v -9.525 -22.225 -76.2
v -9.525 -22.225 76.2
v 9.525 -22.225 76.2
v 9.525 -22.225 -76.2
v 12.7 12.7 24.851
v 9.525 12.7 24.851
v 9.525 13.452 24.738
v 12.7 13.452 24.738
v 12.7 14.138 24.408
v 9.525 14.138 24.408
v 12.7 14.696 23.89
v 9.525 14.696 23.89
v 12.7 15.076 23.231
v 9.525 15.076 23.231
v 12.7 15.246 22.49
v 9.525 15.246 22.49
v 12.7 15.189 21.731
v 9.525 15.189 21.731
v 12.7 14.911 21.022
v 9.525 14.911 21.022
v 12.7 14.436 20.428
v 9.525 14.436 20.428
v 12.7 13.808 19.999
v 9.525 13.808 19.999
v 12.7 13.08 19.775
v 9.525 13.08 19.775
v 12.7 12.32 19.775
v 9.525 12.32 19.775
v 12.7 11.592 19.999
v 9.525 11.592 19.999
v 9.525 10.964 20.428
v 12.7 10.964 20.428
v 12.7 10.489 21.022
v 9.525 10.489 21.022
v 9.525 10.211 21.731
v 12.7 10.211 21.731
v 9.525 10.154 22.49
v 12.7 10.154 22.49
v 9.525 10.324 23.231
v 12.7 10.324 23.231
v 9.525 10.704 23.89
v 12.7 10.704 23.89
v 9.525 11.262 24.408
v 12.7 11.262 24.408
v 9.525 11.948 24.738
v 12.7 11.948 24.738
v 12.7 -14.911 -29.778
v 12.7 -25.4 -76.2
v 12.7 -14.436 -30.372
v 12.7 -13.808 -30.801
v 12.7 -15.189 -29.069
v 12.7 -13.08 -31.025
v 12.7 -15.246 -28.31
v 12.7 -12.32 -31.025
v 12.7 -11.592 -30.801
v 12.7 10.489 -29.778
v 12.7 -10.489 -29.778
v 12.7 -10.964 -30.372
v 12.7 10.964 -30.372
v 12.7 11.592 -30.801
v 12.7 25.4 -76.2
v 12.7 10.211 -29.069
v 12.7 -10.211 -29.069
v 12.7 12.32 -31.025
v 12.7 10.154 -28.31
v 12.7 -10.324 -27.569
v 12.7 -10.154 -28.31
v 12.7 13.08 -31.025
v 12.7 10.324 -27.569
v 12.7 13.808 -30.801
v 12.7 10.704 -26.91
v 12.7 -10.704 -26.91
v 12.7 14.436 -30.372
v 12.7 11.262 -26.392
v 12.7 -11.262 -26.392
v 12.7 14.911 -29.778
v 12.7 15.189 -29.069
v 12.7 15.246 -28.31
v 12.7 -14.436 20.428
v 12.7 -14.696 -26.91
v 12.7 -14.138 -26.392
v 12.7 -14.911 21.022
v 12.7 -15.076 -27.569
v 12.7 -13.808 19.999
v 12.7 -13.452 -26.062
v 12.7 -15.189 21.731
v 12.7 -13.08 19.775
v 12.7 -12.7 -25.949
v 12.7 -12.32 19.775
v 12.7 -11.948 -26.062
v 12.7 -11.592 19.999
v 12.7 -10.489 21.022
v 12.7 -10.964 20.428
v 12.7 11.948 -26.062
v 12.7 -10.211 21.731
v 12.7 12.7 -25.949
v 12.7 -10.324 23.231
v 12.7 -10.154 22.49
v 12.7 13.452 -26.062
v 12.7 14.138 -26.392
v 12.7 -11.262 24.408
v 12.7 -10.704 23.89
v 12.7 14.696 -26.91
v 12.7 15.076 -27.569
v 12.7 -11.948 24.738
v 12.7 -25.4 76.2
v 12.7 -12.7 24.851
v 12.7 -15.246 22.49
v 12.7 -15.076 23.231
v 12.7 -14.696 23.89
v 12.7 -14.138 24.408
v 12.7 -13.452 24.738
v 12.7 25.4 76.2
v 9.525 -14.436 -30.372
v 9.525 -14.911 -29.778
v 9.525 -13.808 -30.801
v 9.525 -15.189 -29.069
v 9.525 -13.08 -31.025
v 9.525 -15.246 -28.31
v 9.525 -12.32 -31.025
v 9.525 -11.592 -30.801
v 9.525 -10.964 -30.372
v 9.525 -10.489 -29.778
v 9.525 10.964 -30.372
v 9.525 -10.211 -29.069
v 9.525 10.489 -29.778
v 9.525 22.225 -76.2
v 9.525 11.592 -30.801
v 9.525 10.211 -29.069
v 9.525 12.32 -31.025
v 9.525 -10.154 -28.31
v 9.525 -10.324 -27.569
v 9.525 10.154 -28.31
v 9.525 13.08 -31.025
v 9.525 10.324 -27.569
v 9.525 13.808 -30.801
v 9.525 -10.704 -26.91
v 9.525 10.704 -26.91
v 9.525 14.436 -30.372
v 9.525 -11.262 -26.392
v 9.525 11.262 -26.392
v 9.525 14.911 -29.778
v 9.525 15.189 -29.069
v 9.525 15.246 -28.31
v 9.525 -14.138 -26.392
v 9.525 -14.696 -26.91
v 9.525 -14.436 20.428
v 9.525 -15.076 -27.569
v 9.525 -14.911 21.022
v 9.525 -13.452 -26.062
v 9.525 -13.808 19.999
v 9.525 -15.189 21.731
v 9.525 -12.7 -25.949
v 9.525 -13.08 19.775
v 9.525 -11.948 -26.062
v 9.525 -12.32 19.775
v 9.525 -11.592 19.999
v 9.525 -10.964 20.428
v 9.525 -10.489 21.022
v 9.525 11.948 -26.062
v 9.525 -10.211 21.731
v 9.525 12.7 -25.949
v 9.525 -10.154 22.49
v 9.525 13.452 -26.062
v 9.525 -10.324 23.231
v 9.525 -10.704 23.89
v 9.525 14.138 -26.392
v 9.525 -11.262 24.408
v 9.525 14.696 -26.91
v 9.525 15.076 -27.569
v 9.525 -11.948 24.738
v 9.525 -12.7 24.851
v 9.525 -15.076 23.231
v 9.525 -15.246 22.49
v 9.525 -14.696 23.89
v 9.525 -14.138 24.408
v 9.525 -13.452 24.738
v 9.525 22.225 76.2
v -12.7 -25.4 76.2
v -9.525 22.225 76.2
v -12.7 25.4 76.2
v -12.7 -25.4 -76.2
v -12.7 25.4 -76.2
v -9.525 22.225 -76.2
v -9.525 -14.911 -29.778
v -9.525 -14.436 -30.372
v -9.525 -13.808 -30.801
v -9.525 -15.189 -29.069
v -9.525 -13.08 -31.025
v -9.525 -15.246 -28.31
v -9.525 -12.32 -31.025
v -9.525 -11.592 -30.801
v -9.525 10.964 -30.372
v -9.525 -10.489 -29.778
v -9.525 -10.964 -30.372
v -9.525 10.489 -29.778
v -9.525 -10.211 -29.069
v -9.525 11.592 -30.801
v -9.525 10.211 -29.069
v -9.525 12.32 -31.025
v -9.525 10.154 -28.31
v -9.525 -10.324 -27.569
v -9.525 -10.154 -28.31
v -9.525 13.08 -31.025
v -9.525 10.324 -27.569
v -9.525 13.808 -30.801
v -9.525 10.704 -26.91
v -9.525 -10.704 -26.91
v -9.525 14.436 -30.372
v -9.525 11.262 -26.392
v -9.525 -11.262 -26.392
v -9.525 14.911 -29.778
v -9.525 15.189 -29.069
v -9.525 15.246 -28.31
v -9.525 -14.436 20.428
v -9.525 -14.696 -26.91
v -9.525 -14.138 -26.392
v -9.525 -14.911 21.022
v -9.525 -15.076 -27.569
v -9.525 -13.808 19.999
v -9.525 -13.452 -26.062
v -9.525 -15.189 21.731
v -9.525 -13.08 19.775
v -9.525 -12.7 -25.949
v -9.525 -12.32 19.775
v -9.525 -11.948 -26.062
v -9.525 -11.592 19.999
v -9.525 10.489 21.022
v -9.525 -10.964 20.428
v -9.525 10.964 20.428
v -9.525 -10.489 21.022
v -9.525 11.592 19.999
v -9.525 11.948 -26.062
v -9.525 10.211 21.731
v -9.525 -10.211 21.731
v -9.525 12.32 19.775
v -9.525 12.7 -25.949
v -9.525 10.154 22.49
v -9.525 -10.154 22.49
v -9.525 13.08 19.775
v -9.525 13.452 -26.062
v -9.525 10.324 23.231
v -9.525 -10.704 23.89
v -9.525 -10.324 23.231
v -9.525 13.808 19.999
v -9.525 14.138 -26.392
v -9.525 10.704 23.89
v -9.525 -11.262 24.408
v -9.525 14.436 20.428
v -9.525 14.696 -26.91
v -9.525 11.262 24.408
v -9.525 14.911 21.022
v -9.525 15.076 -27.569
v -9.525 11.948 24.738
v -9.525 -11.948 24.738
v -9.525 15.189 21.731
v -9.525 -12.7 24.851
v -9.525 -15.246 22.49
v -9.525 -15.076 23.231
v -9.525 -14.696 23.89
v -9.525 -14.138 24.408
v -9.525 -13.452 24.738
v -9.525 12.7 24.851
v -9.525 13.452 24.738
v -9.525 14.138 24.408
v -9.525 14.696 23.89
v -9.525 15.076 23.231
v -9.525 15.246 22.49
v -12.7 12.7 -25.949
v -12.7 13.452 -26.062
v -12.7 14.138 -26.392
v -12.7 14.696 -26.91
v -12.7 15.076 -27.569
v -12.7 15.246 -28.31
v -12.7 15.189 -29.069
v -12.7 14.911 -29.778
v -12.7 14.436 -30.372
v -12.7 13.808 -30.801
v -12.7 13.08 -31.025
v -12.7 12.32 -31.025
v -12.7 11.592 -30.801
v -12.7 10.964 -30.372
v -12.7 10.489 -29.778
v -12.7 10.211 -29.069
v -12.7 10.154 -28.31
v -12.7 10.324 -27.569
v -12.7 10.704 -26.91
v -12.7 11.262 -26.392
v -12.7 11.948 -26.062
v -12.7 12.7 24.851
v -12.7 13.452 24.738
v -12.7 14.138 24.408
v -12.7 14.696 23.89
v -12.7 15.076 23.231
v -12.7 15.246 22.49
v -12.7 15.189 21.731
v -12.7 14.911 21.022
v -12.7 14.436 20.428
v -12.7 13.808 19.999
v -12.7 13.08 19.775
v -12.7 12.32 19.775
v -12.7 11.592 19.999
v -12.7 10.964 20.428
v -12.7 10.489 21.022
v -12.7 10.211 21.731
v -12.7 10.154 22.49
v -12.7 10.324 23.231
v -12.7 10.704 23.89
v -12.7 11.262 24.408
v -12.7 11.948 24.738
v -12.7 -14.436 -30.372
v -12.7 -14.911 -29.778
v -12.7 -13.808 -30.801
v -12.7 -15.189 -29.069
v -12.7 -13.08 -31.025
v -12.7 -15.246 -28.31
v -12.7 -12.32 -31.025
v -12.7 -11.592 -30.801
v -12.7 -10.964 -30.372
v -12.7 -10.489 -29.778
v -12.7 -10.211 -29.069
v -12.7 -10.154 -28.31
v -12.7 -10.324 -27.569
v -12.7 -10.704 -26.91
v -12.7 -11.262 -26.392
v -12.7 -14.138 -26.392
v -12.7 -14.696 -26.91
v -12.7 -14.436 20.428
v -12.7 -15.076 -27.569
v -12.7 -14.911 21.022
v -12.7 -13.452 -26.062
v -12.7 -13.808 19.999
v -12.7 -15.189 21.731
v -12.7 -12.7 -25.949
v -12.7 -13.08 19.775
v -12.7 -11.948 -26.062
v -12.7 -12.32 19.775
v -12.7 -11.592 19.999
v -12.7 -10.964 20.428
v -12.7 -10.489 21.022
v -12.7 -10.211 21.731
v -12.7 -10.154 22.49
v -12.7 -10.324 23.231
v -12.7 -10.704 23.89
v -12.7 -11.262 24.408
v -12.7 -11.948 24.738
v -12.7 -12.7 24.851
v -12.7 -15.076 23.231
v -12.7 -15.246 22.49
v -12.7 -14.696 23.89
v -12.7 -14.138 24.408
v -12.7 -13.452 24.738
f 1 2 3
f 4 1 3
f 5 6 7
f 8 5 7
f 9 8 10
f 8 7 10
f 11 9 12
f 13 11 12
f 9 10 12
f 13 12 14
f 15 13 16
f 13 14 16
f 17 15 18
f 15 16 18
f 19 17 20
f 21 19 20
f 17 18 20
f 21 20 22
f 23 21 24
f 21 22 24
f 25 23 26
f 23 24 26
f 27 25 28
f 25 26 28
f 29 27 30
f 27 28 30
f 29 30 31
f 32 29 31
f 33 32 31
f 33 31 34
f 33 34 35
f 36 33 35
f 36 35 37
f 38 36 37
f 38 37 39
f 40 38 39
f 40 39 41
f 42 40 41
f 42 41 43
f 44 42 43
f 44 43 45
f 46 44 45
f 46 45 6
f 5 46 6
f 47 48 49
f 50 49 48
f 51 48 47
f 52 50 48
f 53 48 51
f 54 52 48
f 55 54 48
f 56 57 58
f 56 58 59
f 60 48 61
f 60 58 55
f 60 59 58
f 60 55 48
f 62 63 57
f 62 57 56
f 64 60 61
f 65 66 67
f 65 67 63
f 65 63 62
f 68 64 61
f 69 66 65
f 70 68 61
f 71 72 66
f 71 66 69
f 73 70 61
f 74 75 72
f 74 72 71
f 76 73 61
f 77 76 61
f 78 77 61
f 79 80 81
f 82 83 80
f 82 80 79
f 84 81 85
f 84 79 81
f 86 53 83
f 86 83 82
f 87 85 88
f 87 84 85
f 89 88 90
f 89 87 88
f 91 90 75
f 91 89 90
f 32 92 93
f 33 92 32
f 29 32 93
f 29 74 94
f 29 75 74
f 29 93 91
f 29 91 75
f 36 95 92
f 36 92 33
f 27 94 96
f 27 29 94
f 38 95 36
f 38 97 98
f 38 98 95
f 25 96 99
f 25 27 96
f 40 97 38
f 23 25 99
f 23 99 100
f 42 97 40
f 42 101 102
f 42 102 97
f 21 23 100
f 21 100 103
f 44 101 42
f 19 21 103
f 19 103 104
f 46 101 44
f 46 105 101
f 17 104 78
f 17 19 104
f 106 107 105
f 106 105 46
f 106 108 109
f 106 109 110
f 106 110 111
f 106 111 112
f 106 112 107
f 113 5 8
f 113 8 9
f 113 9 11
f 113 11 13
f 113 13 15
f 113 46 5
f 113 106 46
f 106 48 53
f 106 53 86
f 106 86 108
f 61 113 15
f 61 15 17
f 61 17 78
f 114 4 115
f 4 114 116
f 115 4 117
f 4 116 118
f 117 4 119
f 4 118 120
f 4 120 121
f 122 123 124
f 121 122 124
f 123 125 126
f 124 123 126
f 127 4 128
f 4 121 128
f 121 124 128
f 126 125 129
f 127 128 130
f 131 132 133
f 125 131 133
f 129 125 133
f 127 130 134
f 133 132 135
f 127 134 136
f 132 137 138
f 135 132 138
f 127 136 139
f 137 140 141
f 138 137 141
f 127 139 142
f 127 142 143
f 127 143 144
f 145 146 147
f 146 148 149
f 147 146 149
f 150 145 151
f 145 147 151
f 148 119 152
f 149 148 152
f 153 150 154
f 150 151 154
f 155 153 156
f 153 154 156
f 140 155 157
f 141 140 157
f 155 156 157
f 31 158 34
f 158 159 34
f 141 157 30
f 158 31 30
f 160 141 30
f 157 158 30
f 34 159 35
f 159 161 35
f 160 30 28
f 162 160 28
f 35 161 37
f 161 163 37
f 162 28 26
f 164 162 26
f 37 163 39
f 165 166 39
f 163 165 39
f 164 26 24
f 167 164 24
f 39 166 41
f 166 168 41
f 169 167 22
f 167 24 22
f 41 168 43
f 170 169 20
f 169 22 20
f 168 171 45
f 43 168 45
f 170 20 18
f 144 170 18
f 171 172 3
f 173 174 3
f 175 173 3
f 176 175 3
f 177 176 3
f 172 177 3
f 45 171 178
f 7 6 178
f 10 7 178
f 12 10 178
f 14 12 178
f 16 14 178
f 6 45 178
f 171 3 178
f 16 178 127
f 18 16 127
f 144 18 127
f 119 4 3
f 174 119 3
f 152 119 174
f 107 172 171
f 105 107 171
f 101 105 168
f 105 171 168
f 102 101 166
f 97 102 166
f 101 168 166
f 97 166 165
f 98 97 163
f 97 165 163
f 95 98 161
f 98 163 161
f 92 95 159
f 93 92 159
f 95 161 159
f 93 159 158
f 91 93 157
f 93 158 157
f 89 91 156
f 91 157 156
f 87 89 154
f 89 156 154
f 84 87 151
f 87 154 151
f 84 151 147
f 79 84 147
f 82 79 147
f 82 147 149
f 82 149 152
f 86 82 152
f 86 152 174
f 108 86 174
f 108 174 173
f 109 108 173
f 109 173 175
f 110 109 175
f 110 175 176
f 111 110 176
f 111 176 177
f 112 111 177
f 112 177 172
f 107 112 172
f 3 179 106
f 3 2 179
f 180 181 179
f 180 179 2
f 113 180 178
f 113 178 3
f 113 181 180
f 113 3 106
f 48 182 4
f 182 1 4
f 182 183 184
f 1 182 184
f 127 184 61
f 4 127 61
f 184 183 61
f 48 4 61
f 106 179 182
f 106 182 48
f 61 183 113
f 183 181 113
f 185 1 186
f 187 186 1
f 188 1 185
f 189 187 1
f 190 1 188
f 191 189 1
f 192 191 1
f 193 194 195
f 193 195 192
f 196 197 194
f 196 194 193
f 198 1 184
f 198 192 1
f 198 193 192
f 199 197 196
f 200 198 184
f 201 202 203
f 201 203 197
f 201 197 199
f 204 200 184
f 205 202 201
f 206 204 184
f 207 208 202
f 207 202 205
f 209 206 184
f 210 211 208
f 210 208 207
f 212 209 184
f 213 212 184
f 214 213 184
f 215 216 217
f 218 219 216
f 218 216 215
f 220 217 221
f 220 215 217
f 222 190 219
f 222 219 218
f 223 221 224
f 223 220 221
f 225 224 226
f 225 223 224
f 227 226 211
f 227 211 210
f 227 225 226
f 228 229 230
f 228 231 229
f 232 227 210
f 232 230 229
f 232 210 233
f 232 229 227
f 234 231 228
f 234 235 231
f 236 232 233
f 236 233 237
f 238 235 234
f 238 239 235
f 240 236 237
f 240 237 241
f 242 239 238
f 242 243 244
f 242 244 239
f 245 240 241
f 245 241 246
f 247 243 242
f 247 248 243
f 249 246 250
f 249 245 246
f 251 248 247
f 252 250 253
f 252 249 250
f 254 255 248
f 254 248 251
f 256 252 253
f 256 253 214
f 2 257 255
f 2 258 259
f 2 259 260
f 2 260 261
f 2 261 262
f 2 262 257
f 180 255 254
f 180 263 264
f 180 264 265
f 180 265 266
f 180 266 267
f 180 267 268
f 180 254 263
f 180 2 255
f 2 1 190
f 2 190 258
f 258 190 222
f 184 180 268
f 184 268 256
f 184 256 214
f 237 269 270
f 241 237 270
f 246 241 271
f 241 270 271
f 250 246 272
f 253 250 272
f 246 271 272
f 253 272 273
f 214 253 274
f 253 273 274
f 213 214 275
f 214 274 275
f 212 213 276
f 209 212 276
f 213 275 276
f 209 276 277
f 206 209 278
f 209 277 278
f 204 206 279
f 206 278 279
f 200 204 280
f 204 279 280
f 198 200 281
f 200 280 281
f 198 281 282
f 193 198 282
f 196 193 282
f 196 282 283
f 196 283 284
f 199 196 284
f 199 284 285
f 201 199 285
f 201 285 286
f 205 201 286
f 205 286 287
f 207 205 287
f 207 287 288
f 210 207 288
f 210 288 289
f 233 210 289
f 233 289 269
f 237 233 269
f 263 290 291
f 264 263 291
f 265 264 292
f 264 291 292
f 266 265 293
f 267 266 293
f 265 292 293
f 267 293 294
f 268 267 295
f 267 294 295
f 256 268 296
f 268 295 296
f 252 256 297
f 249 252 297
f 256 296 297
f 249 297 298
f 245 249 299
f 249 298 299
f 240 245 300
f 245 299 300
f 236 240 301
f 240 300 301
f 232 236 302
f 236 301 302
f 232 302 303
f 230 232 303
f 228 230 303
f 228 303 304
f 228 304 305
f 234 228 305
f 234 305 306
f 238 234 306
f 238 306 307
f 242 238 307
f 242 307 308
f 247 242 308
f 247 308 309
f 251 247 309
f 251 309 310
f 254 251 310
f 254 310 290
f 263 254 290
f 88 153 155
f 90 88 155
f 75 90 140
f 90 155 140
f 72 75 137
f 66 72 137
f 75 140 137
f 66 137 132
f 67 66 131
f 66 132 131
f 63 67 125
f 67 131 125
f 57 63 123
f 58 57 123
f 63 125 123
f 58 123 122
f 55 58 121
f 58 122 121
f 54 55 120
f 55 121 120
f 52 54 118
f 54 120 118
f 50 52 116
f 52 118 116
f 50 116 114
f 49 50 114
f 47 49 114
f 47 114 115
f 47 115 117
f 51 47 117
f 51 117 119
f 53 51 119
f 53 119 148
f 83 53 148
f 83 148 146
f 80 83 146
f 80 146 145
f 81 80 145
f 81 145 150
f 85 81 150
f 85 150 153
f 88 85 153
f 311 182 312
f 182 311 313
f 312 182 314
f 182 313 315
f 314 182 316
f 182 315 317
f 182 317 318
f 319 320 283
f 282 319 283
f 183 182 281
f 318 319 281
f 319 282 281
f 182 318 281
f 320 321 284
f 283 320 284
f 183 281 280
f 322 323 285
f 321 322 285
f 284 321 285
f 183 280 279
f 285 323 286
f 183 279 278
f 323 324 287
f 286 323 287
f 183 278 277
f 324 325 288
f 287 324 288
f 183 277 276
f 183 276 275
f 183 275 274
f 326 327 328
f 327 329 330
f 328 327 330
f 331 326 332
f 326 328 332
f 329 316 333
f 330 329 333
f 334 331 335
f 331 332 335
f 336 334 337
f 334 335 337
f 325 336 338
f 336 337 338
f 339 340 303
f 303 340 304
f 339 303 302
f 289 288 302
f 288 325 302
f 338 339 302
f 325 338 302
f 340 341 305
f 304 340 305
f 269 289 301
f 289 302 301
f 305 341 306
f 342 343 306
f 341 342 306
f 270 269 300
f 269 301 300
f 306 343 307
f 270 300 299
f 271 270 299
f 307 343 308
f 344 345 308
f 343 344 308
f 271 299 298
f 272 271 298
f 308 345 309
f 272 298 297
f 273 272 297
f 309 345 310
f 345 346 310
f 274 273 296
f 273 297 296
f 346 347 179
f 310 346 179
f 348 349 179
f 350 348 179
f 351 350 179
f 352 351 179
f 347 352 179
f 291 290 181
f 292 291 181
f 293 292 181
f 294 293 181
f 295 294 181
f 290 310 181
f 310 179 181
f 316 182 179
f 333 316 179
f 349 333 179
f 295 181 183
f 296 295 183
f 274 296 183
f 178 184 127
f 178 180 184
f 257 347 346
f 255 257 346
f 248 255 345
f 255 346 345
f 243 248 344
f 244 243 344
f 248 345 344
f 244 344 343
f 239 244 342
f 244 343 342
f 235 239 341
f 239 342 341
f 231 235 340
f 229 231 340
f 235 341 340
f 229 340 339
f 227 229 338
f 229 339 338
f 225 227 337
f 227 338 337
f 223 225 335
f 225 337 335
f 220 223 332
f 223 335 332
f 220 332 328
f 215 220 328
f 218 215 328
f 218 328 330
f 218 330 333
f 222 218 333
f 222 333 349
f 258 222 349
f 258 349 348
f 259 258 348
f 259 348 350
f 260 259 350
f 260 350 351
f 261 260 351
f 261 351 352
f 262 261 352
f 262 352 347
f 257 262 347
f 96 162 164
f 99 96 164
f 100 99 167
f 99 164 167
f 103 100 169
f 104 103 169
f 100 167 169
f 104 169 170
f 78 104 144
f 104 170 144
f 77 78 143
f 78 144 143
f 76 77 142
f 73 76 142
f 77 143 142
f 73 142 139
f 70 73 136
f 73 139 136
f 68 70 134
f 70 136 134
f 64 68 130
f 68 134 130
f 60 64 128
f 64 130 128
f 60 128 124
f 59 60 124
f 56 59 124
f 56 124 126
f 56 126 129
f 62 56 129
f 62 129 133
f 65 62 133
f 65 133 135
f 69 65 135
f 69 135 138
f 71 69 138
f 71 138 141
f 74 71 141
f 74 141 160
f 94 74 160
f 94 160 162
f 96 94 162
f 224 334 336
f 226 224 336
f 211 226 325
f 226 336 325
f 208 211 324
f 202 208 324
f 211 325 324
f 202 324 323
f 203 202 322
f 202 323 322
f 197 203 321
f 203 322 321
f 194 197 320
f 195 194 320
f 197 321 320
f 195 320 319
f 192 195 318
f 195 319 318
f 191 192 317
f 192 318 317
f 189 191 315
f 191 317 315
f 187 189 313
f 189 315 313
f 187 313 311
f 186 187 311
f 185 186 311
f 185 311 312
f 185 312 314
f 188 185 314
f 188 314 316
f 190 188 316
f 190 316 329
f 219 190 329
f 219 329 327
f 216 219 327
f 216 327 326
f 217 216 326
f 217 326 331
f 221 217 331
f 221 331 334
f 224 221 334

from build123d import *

# Parameters (mm, degrees)
SKETCH1_W              = 25.4
SKETCH1_H              = 50.8
SKETCH1_W_2            = 19.05
SKETCH1_H_2            = 44.45
BOSS_EXTRUDE1_DEPTH    = 76.2
F_10_CLEARANCE_HOLE1_D = 5.1054


with BuildPart() as part:
    # Sketch1 → Boss-Extrude1 (new, symmetric)
    with BuildSketch(Plane.XY):
        Rectangle(SKETCH1_W, SKETCH1_H)
        Rectangle(SKETCH1_W_2, SKETCH1_H_2, mode=Mode.SUBTRACT)
    extrude(amount=BOSS_EXTRUDE1_DEPTH, both=True)

    # #10 Clearance Hole1 (through all)
    with Locations(Plane(origin=(12.7, 0, 0), x_dir=(0, 0, -1), z_dir=(1, 0, 0))):
        with Locations((-22.298769885, 12.7), (28.501230115, 12.7), (28.501230115, -12.7), (-22.298769885, -12.7)):
            Hole(F_10_CLEARANCE_HOLE1_D / 2)


solid = part.part
